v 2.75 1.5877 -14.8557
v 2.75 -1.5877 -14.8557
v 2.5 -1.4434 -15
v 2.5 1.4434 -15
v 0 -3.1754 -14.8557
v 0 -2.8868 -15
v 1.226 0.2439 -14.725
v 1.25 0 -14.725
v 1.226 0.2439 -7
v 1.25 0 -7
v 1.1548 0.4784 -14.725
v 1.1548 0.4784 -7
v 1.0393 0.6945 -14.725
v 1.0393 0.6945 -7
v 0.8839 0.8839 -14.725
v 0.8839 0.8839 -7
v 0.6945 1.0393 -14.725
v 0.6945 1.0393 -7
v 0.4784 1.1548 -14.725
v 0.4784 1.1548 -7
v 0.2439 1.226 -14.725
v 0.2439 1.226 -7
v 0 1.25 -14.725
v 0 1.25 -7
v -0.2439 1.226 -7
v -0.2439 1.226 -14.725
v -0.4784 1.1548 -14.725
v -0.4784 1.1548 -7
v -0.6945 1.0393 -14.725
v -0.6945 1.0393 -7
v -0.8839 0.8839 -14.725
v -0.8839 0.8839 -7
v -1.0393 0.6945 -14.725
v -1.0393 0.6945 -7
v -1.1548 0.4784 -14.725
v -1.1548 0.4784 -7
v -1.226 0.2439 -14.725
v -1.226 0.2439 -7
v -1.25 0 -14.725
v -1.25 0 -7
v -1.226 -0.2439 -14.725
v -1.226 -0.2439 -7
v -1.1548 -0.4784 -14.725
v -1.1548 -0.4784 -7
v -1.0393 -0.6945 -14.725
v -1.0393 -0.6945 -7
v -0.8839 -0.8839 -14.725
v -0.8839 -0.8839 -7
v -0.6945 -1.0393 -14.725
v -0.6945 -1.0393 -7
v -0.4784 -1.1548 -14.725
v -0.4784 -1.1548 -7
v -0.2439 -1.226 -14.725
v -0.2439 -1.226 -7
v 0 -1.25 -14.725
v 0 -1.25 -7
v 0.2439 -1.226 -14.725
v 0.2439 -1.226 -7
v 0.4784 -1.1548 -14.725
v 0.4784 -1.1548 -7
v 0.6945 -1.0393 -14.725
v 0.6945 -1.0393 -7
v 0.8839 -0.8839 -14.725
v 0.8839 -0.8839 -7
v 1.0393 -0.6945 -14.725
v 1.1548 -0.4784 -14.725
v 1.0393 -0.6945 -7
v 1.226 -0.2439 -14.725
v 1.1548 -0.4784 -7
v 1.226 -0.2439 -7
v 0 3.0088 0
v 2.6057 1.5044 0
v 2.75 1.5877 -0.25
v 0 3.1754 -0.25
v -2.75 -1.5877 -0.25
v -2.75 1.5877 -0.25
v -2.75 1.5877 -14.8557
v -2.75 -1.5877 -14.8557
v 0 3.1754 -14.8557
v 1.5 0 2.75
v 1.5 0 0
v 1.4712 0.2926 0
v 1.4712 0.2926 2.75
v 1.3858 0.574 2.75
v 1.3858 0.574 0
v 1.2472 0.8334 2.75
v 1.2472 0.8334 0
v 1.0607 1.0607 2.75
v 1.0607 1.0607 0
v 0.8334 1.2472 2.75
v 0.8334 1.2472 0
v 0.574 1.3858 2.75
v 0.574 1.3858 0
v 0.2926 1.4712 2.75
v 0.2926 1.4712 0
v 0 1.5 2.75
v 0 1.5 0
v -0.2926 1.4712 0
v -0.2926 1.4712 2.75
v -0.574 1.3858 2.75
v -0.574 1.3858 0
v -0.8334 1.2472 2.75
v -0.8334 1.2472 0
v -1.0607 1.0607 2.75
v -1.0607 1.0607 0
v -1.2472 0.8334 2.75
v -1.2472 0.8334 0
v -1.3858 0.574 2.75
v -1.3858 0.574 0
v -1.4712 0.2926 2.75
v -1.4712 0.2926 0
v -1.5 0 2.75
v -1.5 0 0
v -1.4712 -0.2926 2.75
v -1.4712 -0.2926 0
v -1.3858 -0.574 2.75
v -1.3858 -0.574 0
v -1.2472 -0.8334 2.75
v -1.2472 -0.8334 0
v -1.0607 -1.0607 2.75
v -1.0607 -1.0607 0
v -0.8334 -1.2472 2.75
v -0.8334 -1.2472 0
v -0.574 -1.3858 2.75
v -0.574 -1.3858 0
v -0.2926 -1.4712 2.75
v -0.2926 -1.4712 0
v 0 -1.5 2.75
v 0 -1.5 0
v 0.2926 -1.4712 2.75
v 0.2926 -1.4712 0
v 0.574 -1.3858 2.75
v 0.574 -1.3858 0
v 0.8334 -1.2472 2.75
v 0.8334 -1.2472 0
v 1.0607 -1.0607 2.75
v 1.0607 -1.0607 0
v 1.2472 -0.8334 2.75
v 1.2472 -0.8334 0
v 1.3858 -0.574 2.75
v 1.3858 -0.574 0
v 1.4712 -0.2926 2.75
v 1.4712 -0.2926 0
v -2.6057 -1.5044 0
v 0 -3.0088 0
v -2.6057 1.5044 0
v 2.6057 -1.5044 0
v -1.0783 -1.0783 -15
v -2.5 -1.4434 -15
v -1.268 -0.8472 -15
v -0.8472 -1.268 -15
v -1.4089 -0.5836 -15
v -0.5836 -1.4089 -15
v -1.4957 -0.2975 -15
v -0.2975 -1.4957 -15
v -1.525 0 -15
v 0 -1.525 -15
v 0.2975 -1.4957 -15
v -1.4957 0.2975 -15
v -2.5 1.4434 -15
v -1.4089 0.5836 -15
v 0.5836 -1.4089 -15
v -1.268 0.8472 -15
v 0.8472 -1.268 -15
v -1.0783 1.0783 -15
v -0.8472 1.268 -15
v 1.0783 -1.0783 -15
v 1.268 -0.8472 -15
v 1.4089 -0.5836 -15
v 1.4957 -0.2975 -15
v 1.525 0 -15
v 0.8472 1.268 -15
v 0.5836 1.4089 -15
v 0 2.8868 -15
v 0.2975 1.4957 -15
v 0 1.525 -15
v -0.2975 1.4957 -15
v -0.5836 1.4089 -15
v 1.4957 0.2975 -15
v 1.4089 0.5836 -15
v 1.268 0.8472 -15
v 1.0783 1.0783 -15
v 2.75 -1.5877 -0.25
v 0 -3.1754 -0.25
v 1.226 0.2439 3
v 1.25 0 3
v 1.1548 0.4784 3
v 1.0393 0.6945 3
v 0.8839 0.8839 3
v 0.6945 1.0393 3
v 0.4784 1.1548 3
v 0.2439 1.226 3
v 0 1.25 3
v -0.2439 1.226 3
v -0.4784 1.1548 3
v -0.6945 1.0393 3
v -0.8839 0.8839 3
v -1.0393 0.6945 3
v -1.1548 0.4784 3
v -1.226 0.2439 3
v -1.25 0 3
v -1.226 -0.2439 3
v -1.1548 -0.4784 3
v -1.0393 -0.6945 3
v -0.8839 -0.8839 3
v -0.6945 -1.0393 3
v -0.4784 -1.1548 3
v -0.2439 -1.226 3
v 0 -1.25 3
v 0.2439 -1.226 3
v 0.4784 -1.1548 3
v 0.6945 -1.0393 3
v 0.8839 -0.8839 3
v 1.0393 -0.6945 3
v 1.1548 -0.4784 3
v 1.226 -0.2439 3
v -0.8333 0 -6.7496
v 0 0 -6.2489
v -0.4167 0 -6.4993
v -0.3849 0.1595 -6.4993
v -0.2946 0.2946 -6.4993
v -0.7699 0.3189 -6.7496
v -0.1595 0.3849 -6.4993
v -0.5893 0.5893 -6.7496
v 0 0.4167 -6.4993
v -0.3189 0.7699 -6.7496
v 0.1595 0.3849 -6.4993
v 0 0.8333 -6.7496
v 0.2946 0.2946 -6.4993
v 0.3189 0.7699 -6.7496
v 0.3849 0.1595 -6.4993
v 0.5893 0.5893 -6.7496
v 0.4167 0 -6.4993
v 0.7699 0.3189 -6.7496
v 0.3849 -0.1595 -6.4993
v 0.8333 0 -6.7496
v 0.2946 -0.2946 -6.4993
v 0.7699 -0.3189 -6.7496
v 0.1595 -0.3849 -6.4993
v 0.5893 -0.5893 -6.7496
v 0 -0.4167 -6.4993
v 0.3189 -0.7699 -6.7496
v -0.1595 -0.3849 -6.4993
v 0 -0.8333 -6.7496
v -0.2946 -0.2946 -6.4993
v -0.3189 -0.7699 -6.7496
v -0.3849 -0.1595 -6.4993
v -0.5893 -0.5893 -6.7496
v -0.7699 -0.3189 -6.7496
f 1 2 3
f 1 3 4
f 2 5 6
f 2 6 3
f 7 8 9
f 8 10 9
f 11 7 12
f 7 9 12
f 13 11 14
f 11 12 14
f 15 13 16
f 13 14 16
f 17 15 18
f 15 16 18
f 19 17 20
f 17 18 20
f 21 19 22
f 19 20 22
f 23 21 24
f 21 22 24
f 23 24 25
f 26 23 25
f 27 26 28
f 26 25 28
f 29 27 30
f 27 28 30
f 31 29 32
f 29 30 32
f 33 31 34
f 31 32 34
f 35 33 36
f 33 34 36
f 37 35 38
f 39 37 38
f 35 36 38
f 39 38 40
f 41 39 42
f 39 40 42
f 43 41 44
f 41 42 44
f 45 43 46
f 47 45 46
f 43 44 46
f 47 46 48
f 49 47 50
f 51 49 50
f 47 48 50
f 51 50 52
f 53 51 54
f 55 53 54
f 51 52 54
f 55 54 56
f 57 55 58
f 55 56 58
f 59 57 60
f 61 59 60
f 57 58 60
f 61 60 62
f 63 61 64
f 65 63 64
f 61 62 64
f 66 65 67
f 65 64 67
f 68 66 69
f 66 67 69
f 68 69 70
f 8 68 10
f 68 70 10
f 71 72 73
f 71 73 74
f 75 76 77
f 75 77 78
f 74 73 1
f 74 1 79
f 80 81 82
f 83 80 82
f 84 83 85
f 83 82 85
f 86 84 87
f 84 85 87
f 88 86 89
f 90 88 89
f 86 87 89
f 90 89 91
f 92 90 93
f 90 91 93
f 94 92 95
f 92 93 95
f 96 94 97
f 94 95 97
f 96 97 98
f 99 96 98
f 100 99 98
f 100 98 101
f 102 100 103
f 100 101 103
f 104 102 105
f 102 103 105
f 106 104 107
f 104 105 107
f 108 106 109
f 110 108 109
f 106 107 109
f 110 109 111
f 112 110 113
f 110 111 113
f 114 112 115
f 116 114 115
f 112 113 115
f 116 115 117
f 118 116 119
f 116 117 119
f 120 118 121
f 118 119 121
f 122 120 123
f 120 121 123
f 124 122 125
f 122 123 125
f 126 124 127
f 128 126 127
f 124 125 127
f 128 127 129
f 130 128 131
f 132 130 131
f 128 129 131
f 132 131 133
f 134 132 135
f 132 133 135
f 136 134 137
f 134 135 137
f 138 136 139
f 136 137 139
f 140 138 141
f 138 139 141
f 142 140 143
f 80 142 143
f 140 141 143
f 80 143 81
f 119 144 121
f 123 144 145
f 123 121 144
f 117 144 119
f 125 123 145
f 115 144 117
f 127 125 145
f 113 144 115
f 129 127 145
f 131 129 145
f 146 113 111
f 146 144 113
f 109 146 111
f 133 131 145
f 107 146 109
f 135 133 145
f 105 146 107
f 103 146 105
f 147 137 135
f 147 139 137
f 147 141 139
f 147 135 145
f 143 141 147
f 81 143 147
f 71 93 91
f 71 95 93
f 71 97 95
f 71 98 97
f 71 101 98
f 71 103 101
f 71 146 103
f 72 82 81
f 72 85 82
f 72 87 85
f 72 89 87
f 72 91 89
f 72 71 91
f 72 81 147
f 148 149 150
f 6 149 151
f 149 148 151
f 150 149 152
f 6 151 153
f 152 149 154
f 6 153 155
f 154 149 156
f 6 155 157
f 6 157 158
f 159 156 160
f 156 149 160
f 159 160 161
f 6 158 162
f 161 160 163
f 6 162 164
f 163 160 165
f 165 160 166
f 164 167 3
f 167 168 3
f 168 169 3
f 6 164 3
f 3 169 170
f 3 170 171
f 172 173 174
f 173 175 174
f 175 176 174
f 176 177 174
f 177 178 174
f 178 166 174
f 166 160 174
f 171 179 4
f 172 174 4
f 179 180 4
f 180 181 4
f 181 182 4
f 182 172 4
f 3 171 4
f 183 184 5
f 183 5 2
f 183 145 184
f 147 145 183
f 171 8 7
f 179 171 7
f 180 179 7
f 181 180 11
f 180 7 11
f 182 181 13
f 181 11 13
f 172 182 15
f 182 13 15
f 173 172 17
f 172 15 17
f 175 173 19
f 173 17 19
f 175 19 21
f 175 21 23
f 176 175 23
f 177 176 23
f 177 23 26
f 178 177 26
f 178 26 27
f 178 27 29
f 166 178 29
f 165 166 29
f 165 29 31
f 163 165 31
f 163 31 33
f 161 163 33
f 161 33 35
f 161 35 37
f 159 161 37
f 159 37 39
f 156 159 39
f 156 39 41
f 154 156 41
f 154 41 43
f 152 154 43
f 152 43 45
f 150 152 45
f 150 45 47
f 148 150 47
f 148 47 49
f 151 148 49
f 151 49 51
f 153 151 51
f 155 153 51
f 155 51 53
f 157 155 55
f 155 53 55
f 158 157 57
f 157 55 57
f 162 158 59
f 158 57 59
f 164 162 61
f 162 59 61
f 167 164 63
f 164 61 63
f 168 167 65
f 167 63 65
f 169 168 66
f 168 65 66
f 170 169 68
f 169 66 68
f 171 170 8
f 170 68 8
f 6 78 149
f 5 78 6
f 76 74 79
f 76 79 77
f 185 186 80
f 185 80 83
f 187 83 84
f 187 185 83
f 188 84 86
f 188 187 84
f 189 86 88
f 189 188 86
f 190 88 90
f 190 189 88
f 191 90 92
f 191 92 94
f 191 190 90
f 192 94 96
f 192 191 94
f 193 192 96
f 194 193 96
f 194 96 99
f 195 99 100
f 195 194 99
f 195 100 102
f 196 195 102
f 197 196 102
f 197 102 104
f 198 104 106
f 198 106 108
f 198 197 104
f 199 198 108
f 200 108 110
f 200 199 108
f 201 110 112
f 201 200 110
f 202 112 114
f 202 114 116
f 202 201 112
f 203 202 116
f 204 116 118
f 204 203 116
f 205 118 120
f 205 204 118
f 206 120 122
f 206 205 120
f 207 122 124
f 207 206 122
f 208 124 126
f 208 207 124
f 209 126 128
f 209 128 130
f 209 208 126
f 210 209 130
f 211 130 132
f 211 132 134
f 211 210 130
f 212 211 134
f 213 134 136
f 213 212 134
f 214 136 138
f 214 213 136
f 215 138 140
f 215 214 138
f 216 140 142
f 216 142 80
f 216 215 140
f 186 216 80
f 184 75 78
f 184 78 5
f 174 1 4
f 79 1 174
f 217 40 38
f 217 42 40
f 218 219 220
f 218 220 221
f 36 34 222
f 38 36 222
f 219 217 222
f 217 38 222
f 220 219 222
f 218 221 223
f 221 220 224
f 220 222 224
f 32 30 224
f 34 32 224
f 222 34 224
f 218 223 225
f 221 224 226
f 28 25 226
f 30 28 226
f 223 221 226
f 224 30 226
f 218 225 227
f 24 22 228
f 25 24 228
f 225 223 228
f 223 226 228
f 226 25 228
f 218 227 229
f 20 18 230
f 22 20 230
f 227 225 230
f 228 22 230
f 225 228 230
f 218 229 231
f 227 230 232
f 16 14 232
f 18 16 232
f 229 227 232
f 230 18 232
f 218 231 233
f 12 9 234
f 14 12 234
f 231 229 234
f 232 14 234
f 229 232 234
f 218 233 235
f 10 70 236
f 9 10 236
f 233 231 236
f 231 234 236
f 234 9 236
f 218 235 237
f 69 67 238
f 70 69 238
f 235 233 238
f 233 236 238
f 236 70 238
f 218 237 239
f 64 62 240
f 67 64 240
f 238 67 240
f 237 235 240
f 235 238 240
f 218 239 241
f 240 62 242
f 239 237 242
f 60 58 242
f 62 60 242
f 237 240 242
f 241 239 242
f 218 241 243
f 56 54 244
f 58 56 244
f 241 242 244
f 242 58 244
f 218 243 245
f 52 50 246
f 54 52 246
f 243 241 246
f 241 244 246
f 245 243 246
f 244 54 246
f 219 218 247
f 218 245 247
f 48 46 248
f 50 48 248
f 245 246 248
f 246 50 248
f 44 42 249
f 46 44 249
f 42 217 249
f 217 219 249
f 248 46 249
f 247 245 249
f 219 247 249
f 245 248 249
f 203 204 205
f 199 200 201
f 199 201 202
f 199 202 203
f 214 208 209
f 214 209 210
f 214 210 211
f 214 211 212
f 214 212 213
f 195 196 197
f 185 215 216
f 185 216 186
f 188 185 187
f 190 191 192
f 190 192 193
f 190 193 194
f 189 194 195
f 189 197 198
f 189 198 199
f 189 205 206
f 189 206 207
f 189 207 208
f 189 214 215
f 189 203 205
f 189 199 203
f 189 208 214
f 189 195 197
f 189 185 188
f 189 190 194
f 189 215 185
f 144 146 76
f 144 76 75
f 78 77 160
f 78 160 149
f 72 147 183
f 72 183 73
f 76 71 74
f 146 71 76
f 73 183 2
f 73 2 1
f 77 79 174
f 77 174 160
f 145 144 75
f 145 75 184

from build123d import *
from OCP.BRepFilletAPI import BRepFilletAPI_MakeChamfer

# Parameters (mm, degrees)
EXTRUDE_1_DEPTH      = 15
M3X0_5_1_D           = 2.5
M3X0_5_1_DEPTH       = 8
M3X0_5_1_CSINK_D     = 3.05
M3X0_5_1_CSINK_ANGLE = 90
M3X0_5_1_TIP         = 0.751075774
SKETCH_4_R           = 1.5
EXTRUDE_2_DEPTH      = 3
CHAMFER_1_SIZE       = 0.25
CHAMFER_2_SIZE       = 0.25
CHAMFER_2_SIZE2      = 0.144337567


with BuildPart() as part:
    # ｽｹｯﾁ1 → ﾎﾞｽ - 押し出し1 (new body)
    with BuildSketch(Plane.XY):
        Polygon((-2.75, 1.58771324), (-2.75, -1.58771324), (0, -3.175426481), (2.75, -1.58771324), (2.75, 1.58771324), (0, 3.175426481), align=None)
    extrude(amount=-EXTRUDE_1_DEPTH)

    # M3x0.5 ねじ穴1
    with Locations(Plane(origin=(0, 0, -15), x_dir=(-1, 0, 0), z_dir=(0, 0, -1))):
        with Locations((0, 0)):
            CounterSinkHole(M3X0_5_1_D / 2, M3X0_5_1_CSINK_D / 2, depth=M3X0_5_1_DEPTH, counter_sink_angle=M3X0_5_1_CSINK_ANGLE)
            with Locations((0, 0, -(M3X0_5_1_DEPTH + M3X0_5_1_TIP / 2))):  # 118° drill point
                Cone(0, M3X0_5_1_D / 2, M3X0_5_1_TIP, mode=Mode.SUBTRACT)

    # ｽｹｯﾁ4 → ﾎﾞｽ - 押し出し2 (add)
    with BuildSketch(Plane.XY):
        Circle(SKETCH_4_R)
    extrude(amount=EXTRUDE_2_DEPTH)

    # 面取り1
    chamfer_1_edges = [part.edges().sort_by_distance(p)[0] for p in [
        (-1.5, 0, 3),
    ]]
    chamfer(chamfer_1_edges, length=CHAMFER_1_SIZE)

    # 面取り2: one chamfer whose edges measure the first distance from different faces: ONE call of the kernel's chamfer builder (chamfer() names one face for all edges)
    chamfer_2_edges_1 = [part.edges().sort_by_distance(p)[0] for p in [
        (-1.375, -2.38156986, -15),
        (1.375, -2.38156986, -15),
        (2.75, 0, -15),
        (1.375, 2.38156986, -15),
        (-1.375, 2.38156986, -15),
        (-2.75, 0, -15),
    ]]
    chamfer_2_side_1 = [part.faces().sort_by_distance(p)[0] for p in [
        (-2.665986112, 0, -15),
    ]]
    chamfer_2_edges_2 = [part.edges().sort_by_distance(p)[0] for p in [
        (1.375, 2.38156986, 0),
    ]]
    chamfer_2_side_2 = [part.faces().sort_by_distance(p)[0] for p in [
        (1.375, 2.38156986, -7.5),
    ]]
    chamfer_2_edges_3 = [part.edges().sort_by_distance(p)[0] for p in [
        (2.75, 0, 0),
    ]]
    chamfer_2_side_3 = [part.faces().sort_by_distance(p)[0] for p in [
        (2.75, 0, -7.5),
    ]]
    chamfer_2_edges_4 = [part.edges().sort_by_distance(p)[0] for p in [
        (1.375, -2.38156986, 0),
    ]]
    chamfer_2_side_4 = [part.faces().sort_by_distance(p)[0] for p in [
        (1.375, -2.38156986, -7.5),
    ]]
    chamfer_2_edges_5 = [part.edges().sort_by_distance(p)[0] for p in [
        (-1.375, -2.38156986, 0),
    ]]
    chamfer_2_side_5 = [part.faces().sort_by_distance(p)[0] for p in [
        (-1.375, -2.38156986, -7.5),
    ]]
    chamfer_2_edges_6 = [part.edges().sort_by_distance(p)[0] for p in [
        (-2.75, 0, 0),
    ]]
    chamfer_2_side_6 = [part.faces().sort_by_distance(p)[0] for p in [
        (-2.75, 0, -7.5),
    ]]
    chamfer_2_edges_7 = [part.edges().sort_by_distance(p)[0] for p in [
        (-1.375, 2.38156986, 0),
    ]]
    chamfer_2_side_7 = [part.faces().sort_by_distance(p)[0] for p in [
        (-1.375, 2.38156986, -7.5),
    ]]
    chamfer_2 = BRepFilletAPI_MakeChamfer(part.part.solid().wrapped)
    for e in chamfer_2_edges_1:
        chamfer_2.Add(CHAMFER_2_SIZE, CHAMFER_2_SIZE2, e.wrapped, chamfer_2_side_1[0].wrapped)  # the first distance lies on this face
    for e in chamfer_2_edges_2:
        chamfer_2.Add(CHAMFER_2_SIZE, CHAMFER_2_SIZE2, e.wrapped, chamfer_2_side_2[0].wrapped)  # the first distance lies on this face
    for e in chamfer_2_edges_3:
        chamfer_2.Add(CHAMFER_2_SIZE, CHAMFER_2_SIZE2, e.wrapped, chamfer_2_side_3[0].wrapped)  # the first distance lies on this face
    for e in chamfer_2_edges_4:
        chamfer_2.Add(CHAMFER_2_SIZE, CHAMFER_2_SIZE2, e.wrapped, chamfer_2_side_4[0].wrapped)  # the first distance lies on this face
    for e in chamfer_2_edges_5:
        chamfer_2.Add(CHAMFER_2_SIZE, CHAMFER_2_SIZE2, e.wrapped, chamfer_2_side_5[0].wrapped)  # the first distance lies on this face
    for e in chamfer_2_edges_6:
        chamfer_2.Add(CHAMFER_2_SIZE, CHAMFER_2_SIZE2, e.wrapped, chamfer_2_side_6[0].wrapped)  # the first distance lies on this face
    for e in chamfer_2_edges_7:
        chamfer_2.Add(CHAMFER_2_SIZE, CHAMFER_2_SIZE2, e.wrapped, chamfer_2_side_7[0].wrapped)  # the first distance lies on this face
    add(Compound.cast(chamfer_2.Shape()), mode=Mode.REPLACE)


solid = part.part
